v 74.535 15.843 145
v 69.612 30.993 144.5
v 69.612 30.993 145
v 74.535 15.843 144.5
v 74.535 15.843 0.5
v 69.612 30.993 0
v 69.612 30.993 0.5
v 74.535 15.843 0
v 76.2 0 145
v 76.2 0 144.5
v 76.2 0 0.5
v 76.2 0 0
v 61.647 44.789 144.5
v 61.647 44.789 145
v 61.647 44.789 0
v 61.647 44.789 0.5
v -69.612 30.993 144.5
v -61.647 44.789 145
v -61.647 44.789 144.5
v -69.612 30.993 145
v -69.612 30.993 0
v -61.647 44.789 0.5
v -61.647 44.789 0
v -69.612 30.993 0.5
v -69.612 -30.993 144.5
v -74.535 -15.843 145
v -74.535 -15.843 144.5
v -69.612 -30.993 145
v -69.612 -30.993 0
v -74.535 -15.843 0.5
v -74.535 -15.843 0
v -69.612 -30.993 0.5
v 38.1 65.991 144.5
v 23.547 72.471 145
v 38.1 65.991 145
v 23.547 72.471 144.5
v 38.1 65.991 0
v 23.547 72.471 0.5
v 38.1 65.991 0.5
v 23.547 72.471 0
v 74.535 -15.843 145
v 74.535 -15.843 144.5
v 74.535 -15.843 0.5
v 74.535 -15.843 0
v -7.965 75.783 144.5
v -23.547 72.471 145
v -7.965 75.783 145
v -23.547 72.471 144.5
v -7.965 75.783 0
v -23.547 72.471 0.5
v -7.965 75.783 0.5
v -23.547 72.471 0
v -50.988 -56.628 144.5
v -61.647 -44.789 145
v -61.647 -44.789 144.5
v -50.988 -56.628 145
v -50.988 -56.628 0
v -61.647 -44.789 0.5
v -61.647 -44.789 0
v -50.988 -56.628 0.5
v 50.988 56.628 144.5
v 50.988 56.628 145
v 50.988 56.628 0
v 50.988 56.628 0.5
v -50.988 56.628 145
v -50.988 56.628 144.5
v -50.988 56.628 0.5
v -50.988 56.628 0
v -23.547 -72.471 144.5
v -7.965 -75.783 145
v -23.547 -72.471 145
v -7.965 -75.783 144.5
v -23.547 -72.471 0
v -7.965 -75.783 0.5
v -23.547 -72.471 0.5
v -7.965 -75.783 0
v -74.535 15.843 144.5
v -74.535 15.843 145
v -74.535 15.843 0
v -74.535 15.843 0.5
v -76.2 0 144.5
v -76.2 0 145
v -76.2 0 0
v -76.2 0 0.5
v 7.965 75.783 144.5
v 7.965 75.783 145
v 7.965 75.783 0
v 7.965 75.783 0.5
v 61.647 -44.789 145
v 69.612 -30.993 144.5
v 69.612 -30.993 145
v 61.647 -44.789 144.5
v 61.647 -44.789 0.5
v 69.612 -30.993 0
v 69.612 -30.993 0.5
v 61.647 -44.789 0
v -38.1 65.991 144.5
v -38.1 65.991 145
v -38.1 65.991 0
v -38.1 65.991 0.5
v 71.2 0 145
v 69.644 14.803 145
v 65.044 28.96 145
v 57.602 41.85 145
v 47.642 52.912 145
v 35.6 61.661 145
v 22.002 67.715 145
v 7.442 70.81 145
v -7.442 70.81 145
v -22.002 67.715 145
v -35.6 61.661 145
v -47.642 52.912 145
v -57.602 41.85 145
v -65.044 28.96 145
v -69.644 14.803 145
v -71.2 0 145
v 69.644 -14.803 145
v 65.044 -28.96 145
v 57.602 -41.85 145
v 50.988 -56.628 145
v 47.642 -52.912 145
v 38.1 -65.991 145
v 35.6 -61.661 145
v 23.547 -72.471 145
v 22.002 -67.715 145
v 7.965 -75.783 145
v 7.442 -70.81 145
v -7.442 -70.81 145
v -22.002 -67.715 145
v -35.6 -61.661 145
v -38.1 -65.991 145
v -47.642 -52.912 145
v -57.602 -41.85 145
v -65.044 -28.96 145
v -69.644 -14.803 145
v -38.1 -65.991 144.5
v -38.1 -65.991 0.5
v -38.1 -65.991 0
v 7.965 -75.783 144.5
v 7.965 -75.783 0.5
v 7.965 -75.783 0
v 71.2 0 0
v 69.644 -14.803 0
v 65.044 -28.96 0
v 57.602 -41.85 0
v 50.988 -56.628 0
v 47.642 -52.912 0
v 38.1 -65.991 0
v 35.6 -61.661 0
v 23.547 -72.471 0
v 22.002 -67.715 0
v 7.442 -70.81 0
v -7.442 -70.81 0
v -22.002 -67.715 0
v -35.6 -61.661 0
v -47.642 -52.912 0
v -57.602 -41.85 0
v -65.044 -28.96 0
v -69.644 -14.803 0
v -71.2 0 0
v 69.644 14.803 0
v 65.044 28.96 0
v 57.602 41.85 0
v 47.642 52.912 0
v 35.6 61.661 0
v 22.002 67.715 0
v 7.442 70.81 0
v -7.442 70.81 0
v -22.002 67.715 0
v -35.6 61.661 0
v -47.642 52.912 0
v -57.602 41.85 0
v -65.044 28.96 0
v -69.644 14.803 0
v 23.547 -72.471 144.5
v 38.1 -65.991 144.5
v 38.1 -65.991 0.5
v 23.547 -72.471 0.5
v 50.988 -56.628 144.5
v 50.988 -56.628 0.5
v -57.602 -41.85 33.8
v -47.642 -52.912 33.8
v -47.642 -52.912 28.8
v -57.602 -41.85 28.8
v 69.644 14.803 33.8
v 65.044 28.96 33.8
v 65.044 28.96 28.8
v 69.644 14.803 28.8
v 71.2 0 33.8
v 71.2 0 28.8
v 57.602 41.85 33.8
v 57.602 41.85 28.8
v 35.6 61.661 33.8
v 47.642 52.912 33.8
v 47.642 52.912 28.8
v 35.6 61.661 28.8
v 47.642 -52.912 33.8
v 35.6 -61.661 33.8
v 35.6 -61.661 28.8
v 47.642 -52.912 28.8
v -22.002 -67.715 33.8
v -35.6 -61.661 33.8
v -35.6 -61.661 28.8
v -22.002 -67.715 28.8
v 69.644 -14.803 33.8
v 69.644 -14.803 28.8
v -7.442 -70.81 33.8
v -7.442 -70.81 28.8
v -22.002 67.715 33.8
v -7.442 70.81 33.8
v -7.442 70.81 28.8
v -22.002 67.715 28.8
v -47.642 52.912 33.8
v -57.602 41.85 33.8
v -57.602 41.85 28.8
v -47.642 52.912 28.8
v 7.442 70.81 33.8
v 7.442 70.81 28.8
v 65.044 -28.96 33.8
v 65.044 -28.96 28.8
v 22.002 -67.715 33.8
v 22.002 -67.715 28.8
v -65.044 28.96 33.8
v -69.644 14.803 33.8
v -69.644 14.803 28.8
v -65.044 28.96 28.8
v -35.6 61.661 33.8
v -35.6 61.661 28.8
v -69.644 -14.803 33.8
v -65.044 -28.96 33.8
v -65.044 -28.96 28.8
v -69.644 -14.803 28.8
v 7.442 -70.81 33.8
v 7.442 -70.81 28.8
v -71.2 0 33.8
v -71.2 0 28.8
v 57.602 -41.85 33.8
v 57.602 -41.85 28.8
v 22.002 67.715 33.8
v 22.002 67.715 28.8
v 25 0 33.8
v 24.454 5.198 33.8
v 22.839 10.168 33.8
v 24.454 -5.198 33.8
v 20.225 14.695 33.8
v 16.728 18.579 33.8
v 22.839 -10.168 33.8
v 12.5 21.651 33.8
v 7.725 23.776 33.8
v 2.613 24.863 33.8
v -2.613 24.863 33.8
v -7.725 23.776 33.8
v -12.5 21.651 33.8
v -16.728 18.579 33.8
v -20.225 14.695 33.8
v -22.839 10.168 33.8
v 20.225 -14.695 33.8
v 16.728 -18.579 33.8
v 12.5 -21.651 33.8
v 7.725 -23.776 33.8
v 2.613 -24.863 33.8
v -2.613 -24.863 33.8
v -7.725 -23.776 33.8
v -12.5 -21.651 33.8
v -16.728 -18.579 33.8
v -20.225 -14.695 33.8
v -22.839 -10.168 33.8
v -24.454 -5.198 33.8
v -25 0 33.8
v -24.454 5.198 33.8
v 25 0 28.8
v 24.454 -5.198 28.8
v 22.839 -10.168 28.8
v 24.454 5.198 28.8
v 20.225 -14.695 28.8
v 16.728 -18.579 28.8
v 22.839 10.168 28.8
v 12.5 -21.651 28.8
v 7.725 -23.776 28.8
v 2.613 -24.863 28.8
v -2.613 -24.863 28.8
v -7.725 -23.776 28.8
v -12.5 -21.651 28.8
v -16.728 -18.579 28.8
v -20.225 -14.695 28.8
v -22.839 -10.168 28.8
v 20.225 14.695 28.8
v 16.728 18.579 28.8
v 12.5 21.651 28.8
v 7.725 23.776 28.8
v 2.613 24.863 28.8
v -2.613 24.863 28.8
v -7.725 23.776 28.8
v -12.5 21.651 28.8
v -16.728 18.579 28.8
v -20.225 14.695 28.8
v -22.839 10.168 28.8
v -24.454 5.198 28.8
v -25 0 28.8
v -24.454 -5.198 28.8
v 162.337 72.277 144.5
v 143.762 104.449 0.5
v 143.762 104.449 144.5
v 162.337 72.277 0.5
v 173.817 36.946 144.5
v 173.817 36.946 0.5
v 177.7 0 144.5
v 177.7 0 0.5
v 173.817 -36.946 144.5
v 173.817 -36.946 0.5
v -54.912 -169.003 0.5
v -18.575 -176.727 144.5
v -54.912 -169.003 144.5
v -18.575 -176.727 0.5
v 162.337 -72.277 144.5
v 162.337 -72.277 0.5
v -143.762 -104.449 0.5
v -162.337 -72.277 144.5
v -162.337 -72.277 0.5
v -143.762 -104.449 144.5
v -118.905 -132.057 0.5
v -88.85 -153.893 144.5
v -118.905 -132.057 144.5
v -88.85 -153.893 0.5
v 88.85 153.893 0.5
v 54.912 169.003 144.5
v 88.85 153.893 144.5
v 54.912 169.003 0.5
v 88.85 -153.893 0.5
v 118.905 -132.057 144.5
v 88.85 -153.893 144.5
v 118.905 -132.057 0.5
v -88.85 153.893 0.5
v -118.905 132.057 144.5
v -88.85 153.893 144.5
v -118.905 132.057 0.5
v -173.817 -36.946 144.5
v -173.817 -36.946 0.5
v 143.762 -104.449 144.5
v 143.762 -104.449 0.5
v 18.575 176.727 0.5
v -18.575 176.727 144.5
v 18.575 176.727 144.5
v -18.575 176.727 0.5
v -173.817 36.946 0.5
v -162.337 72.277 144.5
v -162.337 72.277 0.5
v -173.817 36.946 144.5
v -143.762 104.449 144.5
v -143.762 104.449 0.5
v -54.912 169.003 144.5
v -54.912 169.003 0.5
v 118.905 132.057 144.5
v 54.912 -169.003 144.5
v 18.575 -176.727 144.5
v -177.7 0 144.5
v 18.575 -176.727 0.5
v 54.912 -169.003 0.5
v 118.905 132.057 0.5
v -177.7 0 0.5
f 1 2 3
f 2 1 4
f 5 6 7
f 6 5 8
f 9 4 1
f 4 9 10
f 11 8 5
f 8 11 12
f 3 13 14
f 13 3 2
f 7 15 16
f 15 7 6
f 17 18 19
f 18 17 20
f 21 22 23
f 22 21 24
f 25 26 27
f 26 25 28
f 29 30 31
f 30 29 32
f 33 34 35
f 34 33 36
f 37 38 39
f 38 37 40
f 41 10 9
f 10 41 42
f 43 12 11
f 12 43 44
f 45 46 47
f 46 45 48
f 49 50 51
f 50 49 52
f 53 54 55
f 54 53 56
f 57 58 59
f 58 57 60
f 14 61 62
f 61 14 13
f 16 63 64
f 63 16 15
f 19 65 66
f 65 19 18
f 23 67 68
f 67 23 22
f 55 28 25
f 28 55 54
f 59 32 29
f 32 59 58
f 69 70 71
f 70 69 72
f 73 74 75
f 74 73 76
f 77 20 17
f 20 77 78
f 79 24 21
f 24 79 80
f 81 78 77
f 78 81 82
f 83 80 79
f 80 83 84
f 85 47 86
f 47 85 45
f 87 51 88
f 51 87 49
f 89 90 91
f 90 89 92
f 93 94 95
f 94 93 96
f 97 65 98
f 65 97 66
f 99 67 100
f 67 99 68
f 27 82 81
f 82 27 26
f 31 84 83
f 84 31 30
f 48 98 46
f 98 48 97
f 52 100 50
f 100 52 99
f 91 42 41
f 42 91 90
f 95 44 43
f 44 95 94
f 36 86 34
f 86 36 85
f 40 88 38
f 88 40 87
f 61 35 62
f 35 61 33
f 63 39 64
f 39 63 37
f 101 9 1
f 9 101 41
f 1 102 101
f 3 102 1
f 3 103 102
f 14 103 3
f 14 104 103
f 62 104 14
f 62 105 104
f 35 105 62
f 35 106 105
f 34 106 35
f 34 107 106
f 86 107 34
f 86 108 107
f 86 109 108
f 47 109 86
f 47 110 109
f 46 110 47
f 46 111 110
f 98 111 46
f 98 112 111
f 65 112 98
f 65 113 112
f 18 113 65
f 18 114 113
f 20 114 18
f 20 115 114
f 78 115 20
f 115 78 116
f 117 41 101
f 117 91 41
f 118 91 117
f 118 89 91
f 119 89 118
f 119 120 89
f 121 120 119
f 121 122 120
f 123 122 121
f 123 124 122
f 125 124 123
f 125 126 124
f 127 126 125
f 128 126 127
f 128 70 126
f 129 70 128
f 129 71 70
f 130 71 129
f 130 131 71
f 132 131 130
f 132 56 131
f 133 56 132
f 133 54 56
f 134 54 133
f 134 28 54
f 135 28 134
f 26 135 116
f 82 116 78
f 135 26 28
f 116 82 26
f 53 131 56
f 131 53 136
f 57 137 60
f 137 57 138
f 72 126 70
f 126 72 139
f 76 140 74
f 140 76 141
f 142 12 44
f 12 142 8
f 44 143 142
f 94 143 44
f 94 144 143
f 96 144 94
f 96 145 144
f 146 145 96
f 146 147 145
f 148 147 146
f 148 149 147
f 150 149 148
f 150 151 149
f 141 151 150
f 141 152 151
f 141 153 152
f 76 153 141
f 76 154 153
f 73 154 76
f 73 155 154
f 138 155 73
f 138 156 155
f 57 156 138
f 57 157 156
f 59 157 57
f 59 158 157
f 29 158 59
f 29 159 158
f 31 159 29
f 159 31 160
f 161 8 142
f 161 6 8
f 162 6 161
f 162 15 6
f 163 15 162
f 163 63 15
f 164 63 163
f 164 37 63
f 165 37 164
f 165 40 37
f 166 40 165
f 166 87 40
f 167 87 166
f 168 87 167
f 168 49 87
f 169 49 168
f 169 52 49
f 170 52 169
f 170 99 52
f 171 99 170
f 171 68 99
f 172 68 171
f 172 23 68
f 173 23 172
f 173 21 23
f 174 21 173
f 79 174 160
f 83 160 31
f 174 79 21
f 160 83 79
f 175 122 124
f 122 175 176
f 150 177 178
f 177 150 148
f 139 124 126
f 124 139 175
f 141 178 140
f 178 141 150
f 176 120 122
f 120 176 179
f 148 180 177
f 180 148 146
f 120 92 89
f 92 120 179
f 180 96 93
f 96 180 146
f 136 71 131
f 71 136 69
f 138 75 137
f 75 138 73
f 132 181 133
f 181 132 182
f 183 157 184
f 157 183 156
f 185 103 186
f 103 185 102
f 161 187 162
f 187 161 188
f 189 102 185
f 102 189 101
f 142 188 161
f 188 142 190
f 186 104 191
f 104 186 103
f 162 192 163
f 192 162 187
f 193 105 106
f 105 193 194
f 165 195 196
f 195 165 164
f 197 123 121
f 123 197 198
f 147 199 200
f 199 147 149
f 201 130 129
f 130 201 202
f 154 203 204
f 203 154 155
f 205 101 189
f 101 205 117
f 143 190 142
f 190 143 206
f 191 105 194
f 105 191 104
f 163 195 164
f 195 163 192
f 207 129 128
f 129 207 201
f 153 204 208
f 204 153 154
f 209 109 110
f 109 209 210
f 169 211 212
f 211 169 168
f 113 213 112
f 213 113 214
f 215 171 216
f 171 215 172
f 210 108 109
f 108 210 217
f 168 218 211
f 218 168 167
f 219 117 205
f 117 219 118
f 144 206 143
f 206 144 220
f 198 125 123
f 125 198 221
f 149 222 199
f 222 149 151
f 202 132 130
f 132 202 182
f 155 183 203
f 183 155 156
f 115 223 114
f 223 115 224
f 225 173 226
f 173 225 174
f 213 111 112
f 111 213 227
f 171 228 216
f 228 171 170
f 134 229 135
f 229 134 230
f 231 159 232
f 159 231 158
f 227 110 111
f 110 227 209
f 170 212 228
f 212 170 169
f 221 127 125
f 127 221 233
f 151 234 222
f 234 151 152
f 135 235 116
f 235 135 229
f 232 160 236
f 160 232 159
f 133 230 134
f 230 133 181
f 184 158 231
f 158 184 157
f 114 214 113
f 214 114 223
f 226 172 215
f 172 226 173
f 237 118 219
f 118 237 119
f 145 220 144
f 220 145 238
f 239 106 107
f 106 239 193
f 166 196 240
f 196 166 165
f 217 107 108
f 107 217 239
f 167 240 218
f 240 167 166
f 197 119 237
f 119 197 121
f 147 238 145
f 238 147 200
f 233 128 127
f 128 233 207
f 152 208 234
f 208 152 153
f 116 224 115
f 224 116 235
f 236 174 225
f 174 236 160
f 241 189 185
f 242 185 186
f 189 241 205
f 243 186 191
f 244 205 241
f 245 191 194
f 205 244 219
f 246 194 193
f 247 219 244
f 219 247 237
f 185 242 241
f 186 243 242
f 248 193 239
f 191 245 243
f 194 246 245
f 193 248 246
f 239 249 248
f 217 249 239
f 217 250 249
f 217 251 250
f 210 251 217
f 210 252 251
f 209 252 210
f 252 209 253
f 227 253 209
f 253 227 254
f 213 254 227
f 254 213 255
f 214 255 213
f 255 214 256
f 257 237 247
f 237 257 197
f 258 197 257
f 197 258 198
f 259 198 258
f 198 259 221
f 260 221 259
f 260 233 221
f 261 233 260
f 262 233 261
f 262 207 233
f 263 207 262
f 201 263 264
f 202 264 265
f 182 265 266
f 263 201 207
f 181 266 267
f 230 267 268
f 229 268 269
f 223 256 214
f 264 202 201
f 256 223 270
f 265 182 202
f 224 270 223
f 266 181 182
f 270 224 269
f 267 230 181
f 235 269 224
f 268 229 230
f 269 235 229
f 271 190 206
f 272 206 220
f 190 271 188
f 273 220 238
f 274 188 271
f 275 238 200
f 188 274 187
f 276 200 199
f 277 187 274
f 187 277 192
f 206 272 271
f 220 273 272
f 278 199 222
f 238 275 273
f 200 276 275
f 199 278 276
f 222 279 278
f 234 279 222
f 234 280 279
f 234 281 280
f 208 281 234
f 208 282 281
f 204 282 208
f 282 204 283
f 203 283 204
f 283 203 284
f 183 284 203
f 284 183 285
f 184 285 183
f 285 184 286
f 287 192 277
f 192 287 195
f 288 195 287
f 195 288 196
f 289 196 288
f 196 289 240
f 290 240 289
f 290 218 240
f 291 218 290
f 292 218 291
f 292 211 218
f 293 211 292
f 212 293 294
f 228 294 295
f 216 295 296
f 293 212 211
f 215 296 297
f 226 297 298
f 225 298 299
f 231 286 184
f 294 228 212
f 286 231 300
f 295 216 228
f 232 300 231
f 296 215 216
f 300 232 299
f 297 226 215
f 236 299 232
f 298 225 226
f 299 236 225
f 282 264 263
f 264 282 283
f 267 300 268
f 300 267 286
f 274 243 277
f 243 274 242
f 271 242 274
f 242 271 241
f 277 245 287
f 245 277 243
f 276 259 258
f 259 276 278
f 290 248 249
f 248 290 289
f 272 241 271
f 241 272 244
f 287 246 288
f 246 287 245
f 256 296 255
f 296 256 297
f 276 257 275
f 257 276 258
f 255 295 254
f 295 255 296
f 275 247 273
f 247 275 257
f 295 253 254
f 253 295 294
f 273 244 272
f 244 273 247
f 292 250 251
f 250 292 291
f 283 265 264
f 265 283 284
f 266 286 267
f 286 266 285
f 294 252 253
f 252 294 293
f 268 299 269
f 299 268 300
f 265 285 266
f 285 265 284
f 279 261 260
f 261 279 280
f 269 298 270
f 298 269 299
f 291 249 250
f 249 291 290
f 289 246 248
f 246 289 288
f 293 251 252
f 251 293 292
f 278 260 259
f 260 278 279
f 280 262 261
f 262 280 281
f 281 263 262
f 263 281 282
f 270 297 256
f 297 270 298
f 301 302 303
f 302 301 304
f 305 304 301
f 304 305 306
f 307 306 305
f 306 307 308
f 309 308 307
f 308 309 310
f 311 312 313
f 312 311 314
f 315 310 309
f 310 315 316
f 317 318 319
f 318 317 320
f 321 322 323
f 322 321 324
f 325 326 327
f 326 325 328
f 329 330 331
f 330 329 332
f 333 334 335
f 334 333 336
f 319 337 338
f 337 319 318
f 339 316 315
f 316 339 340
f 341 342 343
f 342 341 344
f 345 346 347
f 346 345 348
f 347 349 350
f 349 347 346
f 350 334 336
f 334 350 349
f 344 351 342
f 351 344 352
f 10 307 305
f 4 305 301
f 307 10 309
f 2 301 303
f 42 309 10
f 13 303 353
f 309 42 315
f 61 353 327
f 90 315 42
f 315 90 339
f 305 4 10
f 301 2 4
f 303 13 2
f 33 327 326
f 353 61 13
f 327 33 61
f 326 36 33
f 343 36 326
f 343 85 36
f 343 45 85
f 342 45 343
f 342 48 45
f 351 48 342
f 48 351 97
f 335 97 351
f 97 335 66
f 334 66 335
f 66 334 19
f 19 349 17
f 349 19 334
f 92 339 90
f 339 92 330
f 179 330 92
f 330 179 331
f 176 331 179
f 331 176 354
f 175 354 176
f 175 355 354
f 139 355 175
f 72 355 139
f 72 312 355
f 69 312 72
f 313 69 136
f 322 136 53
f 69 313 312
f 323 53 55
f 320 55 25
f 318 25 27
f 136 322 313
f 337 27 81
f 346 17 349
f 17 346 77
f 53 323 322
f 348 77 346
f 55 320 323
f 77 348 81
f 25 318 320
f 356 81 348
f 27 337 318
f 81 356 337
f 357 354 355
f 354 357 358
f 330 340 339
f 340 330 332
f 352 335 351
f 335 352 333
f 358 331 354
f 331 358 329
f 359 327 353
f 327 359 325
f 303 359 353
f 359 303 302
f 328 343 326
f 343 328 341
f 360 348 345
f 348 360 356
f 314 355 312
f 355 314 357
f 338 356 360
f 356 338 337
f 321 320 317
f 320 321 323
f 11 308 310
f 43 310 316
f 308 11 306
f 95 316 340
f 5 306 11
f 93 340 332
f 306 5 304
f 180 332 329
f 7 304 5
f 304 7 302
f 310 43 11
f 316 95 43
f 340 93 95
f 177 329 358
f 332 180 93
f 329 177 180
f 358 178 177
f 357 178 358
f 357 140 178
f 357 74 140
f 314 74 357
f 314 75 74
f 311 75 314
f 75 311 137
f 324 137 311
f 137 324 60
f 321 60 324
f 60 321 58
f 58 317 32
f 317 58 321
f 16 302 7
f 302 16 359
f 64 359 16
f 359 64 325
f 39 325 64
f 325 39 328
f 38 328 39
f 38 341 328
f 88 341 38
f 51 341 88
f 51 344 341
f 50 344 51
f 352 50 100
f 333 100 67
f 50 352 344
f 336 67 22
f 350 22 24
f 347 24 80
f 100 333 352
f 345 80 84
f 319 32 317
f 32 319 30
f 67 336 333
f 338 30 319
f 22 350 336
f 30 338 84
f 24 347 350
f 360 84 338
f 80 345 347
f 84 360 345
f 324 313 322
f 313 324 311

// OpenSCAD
module wheel_hub(sw=145, ar=70, rd=6, cd=70, ah=50)
{
	rd_mm=rd*25.4;
	difference()
	{
		cylinder(r=rd_mm/2, h=sw, center=true);	
		cylinder(r=rd_mm/2-5, h=sw+1, center=true);
	}
	difference()
	{
		translate([0,0,-rd_mm/2+5+cd]) cylinder(r=rd_mm/2, h=5, center=true);
		cylinder(r=ah/2, h=sw+1, center=true);	
	}
}

module wheel_tyre(sw=145, ar=70, rd=6, cd=70, ah=50)
{
	rd_mm=rd*25.4;
	tr = (rd_mm/2)+(sw*(70/100));
	difference()
	{
		cylinder(r=tr, h=sw-1, center=true);	
		cylinder(r=rd_mm/2, h=sw+1, center=true);
	}
}

module wheel(sw=145, ar=70, rd=6, cd=70, ah=50)
{
	translate([0,0,145/2])
	{
		color("silver") wheel_hub(sw, ar, rd, cd, ah);
		color([0.3,0.3,0.3]) wheel_tyre(sw, ar, rd, cd, ah);
	}
}


wheel(cd=30);
